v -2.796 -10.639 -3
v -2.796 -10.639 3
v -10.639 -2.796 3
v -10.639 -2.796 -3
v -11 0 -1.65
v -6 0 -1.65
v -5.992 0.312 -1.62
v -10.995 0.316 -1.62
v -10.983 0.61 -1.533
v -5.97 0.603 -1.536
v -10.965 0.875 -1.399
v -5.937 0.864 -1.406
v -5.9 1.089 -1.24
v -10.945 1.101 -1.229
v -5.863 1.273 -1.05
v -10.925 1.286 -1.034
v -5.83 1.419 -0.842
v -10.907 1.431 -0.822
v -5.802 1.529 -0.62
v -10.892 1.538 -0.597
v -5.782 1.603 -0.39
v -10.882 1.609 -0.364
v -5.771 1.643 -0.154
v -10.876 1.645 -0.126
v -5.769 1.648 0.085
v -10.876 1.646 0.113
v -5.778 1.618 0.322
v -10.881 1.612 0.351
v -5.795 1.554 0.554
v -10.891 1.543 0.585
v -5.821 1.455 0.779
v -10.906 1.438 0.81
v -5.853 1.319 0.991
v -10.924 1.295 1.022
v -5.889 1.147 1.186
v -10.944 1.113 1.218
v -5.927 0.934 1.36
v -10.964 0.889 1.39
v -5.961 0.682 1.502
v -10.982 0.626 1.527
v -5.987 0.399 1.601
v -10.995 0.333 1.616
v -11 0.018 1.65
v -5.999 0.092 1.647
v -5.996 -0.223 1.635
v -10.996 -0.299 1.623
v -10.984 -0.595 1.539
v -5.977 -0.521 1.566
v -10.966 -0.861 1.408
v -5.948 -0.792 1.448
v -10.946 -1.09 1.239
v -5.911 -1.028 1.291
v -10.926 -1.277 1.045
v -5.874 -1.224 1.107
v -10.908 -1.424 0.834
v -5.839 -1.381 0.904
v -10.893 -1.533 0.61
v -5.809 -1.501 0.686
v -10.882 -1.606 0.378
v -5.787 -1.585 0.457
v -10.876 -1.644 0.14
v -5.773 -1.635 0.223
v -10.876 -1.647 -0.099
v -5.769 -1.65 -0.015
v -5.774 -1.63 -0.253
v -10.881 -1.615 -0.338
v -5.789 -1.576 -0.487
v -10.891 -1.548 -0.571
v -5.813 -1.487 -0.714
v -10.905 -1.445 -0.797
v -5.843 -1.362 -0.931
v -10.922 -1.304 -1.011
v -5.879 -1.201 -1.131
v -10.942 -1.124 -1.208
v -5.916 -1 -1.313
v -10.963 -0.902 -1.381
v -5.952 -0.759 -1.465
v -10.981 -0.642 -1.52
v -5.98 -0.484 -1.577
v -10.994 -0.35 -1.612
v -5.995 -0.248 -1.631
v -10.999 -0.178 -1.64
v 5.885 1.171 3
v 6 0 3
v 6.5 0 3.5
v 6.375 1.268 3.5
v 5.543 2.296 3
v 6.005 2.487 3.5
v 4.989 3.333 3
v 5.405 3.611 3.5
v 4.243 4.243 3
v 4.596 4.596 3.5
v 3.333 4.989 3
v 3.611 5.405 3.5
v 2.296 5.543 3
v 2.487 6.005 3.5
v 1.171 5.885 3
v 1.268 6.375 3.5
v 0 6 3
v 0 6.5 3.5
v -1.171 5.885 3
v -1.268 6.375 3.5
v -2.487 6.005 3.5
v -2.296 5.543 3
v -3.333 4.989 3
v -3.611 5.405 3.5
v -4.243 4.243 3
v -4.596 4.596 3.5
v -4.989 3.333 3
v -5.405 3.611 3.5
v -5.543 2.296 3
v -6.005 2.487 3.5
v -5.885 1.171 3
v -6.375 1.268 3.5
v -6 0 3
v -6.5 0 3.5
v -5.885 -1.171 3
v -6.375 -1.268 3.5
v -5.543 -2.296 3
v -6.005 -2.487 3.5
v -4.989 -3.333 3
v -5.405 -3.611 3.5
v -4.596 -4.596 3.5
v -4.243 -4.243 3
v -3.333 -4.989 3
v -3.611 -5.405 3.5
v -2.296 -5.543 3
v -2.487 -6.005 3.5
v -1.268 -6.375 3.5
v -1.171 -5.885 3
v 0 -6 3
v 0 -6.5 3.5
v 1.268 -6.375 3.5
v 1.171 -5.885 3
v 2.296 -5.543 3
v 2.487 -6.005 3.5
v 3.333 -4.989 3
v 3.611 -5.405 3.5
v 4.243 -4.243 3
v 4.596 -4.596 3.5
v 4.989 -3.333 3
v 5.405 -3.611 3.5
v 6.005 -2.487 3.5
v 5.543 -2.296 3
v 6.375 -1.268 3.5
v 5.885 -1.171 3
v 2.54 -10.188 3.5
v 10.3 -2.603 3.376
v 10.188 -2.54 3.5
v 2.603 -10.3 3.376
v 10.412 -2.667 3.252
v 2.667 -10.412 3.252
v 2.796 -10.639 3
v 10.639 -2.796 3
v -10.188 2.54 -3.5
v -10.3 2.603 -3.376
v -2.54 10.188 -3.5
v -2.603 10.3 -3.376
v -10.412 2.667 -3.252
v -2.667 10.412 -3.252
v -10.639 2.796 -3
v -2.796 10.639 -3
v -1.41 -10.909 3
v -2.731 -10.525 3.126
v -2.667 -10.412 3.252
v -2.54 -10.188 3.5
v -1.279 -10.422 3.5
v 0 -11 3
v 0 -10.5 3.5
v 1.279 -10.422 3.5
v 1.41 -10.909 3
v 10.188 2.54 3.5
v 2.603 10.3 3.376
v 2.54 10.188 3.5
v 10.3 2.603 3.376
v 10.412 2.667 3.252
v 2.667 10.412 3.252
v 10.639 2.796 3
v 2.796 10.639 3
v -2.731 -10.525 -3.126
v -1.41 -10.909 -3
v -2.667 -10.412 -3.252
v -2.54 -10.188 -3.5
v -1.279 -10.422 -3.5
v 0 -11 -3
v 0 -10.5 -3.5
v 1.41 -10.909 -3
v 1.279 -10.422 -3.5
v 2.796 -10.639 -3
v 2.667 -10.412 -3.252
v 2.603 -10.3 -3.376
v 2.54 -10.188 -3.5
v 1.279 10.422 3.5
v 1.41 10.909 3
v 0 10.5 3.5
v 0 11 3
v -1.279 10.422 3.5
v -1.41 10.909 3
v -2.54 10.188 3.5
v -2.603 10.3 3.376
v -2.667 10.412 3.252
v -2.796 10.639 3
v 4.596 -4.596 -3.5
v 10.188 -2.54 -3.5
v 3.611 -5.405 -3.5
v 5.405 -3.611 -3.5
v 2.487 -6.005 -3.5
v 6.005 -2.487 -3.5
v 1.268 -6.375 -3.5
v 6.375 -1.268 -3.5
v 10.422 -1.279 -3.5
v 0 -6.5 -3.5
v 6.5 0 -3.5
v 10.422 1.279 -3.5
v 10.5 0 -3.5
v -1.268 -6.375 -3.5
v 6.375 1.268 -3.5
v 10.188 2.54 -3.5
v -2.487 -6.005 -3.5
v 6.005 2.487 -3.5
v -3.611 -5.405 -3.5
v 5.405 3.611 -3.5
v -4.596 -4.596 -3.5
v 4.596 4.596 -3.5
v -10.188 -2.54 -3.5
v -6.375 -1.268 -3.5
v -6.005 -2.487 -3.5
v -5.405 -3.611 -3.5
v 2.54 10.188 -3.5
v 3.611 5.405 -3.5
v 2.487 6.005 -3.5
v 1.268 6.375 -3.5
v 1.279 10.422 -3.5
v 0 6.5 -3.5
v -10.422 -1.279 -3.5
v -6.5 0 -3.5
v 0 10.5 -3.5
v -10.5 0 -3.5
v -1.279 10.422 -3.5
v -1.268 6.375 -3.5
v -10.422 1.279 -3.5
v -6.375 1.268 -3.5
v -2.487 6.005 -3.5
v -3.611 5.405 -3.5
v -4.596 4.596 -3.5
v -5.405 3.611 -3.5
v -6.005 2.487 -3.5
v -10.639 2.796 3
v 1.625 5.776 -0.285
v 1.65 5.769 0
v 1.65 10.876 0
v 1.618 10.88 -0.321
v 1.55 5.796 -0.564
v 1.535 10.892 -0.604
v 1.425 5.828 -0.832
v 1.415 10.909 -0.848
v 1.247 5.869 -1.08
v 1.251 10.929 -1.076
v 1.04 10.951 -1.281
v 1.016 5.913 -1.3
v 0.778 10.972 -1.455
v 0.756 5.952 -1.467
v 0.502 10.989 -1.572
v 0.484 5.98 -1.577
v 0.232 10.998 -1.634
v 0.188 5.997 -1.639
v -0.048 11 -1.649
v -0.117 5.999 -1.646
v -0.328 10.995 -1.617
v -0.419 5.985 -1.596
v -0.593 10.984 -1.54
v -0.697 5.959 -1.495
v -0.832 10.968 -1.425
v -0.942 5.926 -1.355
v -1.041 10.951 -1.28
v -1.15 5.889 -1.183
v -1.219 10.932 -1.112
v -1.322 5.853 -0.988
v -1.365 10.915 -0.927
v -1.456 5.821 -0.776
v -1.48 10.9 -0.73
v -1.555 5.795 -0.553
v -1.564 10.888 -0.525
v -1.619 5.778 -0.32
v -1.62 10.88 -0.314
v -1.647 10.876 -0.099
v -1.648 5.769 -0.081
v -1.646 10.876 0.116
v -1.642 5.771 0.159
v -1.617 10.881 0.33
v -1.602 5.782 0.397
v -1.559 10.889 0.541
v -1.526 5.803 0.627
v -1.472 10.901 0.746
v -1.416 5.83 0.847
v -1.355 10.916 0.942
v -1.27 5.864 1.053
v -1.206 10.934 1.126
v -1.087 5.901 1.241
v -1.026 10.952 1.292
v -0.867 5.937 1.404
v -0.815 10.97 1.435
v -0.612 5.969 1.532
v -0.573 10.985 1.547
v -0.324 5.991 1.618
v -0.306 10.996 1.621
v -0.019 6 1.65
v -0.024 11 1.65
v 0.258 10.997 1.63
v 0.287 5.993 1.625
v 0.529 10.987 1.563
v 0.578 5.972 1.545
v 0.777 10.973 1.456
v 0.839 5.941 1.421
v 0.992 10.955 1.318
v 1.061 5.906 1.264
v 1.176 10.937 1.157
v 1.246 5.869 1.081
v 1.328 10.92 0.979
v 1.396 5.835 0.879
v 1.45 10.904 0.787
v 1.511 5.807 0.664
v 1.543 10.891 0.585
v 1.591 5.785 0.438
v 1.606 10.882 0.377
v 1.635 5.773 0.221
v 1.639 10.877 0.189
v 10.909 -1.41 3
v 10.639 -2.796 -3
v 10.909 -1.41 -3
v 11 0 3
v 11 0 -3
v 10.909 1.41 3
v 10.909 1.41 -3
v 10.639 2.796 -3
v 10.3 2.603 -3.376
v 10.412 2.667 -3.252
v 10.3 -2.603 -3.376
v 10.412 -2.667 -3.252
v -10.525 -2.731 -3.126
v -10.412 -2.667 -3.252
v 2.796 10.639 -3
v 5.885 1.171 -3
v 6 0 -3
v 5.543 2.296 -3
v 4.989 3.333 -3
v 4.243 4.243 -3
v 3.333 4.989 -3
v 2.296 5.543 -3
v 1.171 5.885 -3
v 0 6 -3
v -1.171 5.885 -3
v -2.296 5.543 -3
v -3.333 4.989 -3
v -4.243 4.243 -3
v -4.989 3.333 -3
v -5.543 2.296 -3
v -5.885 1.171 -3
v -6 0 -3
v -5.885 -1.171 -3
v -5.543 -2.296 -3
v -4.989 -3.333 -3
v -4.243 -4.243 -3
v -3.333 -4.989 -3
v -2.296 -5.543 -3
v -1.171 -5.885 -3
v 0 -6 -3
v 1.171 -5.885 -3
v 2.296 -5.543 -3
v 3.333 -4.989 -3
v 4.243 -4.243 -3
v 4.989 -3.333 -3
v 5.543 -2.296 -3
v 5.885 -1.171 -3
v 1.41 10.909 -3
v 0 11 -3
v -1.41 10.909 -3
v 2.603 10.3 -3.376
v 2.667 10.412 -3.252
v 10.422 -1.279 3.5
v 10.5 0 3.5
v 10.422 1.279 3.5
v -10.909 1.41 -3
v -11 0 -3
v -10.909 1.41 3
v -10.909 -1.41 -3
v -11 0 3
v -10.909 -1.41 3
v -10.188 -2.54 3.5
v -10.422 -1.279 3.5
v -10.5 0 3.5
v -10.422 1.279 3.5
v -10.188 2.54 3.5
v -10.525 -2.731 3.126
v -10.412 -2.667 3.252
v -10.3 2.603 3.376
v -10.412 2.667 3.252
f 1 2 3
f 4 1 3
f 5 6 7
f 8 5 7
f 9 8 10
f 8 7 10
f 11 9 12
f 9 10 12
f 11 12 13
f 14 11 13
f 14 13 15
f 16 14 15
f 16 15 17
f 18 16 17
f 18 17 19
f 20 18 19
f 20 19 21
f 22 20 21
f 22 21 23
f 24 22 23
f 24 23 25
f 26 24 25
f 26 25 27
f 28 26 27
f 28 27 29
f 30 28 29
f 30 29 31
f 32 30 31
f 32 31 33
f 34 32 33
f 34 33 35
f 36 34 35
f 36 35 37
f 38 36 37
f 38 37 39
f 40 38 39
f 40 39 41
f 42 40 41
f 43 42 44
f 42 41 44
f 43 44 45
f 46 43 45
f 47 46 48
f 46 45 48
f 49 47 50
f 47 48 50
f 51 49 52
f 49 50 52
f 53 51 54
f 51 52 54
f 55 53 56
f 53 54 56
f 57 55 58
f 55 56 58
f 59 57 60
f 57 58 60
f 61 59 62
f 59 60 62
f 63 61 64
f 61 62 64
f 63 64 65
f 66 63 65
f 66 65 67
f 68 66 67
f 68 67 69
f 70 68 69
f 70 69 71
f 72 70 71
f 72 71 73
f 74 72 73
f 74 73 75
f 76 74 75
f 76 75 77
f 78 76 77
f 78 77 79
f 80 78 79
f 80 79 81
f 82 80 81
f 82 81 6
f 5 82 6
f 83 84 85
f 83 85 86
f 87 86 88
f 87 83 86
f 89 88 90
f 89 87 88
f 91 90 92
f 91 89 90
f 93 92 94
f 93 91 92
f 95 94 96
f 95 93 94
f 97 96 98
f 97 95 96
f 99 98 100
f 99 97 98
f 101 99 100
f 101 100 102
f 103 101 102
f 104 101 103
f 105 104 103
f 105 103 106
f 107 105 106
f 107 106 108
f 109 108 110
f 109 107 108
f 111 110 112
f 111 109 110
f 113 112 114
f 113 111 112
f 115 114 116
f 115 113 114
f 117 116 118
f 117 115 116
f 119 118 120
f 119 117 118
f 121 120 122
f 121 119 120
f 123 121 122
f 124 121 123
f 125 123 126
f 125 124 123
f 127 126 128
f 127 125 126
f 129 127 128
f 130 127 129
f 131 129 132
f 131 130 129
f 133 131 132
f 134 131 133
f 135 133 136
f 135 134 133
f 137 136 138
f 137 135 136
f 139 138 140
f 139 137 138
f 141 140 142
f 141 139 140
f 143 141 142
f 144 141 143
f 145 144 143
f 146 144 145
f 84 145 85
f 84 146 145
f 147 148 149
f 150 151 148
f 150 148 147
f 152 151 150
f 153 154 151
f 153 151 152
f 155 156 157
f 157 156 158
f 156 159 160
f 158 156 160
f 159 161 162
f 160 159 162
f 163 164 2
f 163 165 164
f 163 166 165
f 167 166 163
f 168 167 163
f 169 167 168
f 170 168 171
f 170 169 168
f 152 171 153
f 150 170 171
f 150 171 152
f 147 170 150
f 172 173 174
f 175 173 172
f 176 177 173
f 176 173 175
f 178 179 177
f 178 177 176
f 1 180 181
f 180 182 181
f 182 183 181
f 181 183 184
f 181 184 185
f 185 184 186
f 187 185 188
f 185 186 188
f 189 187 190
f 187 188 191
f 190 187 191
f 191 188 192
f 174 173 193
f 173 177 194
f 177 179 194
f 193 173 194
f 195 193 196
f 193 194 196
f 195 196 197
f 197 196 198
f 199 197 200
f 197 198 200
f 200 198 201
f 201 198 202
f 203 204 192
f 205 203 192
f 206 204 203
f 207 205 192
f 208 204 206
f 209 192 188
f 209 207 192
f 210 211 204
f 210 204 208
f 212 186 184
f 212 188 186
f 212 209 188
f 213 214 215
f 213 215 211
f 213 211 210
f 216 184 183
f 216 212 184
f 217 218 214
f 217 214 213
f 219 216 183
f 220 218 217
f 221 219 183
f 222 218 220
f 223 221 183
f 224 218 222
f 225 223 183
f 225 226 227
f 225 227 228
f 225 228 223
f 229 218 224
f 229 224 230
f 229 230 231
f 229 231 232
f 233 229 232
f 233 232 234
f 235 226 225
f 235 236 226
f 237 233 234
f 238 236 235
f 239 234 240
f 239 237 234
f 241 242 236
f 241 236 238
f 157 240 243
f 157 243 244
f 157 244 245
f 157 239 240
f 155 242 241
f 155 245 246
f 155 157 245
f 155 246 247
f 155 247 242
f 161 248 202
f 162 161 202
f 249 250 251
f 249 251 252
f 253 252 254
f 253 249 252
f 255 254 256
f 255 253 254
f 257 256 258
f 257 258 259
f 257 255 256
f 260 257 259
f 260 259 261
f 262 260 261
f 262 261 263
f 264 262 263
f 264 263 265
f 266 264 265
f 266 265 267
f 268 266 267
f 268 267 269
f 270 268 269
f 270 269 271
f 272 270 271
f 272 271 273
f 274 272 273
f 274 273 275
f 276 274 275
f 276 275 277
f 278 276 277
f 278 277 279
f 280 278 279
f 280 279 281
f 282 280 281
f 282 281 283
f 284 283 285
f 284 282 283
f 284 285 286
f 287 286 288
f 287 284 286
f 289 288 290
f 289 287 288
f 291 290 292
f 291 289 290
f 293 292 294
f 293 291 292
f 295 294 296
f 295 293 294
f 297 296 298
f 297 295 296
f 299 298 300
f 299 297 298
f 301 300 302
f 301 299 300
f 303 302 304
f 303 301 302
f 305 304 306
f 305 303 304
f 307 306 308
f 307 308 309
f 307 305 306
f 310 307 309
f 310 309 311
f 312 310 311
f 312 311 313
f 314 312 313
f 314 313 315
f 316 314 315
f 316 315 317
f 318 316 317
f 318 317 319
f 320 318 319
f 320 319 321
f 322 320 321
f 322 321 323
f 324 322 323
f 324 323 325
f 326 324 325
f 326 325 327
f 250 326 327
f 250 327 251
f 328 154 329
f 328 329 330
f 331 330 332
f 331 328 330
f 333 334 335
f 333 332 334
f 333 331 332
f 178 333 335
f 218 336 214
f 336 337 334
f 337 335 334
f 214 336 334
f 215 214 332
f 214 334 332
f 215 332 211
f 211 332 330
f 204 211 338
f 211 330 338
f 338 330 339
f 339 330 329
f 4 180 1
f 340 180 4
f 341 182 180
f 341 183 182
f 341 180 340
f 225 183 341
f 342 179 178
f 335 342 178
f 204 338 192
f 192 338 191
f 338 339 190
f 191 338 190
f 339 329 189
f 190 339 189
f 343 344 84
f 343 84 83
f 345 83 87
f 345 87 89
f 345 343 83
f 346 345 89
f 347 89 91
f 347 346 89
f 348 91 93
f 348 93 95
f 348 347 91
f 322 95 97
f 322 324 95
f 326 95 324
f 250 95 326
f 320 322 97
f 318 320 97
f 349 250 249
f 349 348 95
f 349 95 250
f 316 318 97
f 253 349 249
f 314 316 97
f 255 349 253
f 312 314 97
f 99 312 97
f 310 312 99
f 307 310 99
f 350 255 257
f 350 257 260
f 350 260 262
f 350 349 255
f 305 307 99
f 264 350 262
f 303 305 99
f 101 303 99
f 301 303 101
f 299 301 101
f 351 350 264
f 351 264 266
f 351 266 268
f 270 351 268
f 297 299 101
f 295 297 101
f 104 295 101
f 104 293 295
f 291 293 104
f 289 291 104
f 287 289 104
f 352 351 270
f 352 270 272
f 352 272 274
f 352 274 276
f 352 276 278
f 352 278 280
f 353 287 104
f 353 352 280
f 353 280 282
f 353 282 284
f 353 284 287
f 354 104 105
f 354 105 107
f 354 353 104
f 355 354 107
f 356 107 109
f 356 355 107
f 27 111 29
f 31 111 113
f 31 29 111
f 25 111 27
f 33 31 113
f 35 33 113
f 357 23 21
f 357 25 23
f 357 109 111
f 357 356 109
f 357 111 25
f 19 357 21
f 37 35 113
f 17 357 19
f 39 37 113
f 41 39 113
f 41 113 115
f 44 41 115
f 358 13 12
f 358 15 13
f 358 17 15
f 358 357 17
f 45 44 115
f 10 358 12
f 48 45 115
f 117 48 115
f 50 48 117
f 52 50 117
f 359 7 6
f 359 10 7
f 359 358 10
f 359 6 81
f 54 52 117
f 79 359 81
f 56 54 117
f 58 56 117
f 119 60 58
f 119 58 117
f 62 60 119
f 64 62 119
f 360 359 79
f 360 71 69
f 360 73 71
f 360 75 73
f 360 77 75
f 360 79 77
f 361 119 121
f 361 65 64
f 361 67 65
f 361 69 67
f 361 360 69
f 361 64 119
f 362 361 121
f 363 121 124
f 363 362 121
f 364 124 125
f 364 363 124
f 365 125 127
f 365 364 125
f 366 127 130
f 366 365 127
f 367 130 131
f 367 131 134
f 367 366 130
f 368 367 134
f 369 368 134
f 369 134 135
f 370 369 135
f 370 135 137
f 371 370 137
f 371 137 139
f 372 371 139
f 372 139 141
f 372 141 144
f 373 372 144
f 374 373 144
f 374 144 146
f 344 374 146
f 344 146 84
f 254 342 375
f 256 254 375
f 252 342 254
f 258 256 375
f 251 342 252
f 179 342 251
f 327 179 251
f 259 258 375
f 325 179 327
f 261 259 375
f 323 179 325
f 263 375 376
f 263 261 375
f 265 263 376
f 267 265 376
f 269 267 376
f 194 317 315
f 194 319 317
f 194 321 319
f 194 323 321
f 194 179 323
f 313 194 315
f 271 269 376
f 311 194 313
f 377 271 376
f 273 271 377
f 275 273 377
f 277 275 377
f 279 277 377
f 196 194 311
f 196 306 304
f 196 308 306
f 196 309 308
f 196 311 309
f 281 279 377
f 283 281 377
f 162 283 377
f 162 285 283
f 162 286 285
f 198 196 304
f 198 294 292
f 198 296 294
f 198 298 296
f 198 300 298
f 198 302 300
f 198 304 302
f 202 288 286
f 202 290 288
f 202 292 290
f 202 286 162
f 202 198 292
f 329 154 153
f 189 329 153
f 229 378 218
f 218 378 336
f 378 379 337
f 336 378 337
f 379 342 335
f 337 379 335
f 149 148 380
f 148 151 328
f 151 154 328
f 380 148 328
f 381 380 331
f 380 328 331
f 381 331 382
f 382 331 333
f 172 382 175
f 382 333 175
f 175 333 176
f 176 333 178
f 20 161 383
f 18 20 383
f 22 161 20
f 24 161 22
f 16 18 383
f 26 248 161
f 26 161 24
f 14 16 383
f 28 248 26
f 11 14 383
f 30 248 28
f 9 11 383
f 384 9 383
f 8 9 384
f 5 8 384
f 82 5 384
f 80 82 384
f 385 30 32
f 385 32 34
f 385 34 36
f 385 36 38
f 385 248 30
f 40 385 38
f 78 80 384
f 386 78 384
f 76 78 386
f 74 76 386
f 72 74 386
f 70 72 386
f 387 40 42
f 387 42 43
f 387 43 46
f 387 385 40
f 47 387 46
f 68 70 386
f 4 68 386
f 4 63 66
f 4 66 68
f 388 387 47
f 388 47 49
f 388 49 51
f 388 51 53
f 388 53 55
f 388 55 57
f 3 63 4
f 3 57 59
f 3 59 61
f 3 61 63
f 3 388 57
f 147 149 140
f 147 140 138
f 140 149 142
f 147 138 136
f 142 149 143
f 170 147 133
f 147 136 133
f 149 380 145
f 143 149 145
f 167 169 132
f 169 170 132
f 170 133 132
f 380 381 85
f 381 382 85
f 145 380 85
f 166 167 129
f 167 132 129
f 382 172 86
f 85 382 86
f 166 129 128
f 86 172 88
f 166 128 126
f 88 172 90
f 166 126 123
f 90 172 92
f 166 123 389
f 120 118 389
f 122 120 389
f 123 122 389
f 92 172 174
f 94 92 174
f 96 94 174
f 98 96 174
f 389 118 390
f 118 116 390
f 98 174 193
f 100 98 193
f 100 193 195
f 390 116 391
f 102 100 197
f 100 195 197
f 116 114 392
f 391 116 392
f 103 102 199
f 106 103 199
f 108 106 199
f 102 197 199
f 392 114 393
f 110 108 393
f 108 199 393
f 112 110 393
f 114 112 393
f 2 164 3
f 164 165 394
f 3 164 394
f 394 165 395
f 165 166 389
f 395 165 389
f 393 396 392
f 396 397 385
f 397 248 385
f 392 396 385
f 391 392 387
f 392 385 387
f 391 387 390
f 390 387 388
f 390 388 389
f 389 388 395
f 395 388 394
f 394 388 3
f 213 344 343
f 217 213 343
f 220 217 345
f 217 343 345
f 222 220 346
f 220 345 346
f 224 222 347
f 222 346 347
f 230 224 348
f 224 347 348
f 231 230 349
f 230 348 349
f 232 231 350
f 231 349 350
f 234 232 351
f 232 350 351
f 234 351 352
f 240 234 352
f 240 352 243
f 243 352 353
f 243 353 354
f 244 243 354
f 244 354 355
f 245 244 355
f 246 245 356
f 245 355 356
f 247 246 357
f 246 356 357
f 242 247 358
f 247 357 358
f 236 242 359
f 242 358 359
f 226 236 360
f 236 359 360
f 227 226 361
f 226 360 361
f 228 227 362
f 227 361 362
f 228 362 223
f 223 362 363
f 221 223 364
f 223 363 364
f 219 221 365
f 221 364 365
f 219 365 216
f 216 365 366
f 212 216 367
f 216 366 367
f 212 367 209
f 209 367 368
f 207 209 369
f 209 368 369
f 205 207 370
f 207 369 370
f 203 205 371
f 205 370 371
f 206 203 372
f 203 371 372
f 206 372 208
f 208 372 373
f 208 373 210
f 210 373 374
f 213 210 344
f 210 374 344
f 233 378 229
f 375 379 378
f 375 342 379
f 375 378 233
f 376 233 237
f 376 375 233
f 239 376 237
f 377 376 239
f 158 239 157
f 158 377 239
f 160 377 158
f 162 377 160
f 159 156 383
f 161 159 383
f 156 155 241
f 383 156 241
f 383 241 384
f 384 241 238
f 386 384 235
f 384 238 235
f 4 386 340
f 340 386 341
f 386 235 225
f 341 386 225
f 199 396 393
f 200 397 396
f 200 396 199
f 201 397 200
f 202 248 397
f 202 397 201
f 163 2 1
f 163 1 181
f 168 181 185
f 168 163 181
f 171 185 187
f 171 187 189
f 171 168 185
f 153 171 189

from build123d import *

# Parameters (mm, degrees)
SKETCH1_R           = 6
BOSS_EXTRUDE1_DEPTH = 3.5
SKETCH2_OUTSIDE_W   = 36.598
SKETCH2_OUTSIDE_H   = 36.598
SKETCH2_OUTSIDE_R   = 11
CUT_EXTRUDE1_DEPTH  = 8
SKETCH4_R           = 1.65
CUT_EXTRUDE2_DEPTH  = 12
SKETCH5_R           = 1.65
CUT_EXTRUDE3_DEPTH  = 12
CHAMFER1_SIZE       = 0.5


with BuildPart() as part:
    # Sketch1 → Boss-Extrude1 (new body, symmetric)
    with BuildSketch(Plane.XY):
        Polygon((0, -13.435028843), (-13.435028843, 0), (0, 13.435028843), (13.435028843, 0), align=None)
        Circle(SKETCH1_R, mode=Mode.SUBTRACT)
    extrude(amount=BOSS_EXTRUDE1_DEPTH, both=True)

    # Sketch2 outside → Cut-Extrude1 (cut, through all)
    with BuildSketch(Plane.XY.offset(3.5)):
        Rectangle(SKETCH2_OUTSIDE_W, SKETCH2_OUTSIDE_H)
        Circle(SKETCH2_OUTSIDE_R, mode=Mode.SUBTRACT)
    extrude(amount=-CUT_EXTRUDE1_DEPTH, mode=Mode.SUBTRACT)

    # Sketch4 → Cut-Extrude2 (cut, through all)
    with BuildSketch(Plane(origin=(0, 0, 0), x_dir=(1, 0, 0), z_dir=(0, 1, 0))):
        Circle(SKETCH4_R)
    extrude(amount=CUT_EXTRUDE2_DEPTH, mode=Mode.SUBTRACT)

    # Sketch5 → Cut-Extrude3 (cut, through all)
    with BuildSketch(Plane(origin=(0, 0, 0), x_dir=(0, 0, -1), z_dir=(1, 0, 0))):
        Circle(SKETCH5_R)
    extrude(amount=-CUT_EXTRUDE3_DEPTH, mode=Mode.SUBTRACT)

    # Chamfer1
    chamfer1_edges = [part.edges().sort_by_distance(p)[0] for p in [
        (-6, 0, -3.5),
        (-6, 0, 3.5),
        (6.717514421, 6.717514421, -3.5),
        (6.717514421, 6.717514421, 3.5),
        (6.717514421, -6.717514421, -3.5),
        (6.717514421, -6.717514421, 3.5),
        (-6.717514421, -6.717514421, -3.5),
        (-6.717514421, -6.717514421, 3.5),
        (-6.717514421, 6.717514421, -3.5),
        (-6.717514421, 6.717514421, 3.5),
        (-11, 0, -3.5),
        (0, -11, -3.5),
        (11, 0, -3.5),
        (0, 11, -3.5),
        (0, 11, 3.5),
        (-11, 0, 3.5),
        (0, -11, 3.5),
        (11, 0, 3.5),
    ]]
    chamfer(chamfer1_edges, length=CHAMFER1_SIZE)


solid = part.part
